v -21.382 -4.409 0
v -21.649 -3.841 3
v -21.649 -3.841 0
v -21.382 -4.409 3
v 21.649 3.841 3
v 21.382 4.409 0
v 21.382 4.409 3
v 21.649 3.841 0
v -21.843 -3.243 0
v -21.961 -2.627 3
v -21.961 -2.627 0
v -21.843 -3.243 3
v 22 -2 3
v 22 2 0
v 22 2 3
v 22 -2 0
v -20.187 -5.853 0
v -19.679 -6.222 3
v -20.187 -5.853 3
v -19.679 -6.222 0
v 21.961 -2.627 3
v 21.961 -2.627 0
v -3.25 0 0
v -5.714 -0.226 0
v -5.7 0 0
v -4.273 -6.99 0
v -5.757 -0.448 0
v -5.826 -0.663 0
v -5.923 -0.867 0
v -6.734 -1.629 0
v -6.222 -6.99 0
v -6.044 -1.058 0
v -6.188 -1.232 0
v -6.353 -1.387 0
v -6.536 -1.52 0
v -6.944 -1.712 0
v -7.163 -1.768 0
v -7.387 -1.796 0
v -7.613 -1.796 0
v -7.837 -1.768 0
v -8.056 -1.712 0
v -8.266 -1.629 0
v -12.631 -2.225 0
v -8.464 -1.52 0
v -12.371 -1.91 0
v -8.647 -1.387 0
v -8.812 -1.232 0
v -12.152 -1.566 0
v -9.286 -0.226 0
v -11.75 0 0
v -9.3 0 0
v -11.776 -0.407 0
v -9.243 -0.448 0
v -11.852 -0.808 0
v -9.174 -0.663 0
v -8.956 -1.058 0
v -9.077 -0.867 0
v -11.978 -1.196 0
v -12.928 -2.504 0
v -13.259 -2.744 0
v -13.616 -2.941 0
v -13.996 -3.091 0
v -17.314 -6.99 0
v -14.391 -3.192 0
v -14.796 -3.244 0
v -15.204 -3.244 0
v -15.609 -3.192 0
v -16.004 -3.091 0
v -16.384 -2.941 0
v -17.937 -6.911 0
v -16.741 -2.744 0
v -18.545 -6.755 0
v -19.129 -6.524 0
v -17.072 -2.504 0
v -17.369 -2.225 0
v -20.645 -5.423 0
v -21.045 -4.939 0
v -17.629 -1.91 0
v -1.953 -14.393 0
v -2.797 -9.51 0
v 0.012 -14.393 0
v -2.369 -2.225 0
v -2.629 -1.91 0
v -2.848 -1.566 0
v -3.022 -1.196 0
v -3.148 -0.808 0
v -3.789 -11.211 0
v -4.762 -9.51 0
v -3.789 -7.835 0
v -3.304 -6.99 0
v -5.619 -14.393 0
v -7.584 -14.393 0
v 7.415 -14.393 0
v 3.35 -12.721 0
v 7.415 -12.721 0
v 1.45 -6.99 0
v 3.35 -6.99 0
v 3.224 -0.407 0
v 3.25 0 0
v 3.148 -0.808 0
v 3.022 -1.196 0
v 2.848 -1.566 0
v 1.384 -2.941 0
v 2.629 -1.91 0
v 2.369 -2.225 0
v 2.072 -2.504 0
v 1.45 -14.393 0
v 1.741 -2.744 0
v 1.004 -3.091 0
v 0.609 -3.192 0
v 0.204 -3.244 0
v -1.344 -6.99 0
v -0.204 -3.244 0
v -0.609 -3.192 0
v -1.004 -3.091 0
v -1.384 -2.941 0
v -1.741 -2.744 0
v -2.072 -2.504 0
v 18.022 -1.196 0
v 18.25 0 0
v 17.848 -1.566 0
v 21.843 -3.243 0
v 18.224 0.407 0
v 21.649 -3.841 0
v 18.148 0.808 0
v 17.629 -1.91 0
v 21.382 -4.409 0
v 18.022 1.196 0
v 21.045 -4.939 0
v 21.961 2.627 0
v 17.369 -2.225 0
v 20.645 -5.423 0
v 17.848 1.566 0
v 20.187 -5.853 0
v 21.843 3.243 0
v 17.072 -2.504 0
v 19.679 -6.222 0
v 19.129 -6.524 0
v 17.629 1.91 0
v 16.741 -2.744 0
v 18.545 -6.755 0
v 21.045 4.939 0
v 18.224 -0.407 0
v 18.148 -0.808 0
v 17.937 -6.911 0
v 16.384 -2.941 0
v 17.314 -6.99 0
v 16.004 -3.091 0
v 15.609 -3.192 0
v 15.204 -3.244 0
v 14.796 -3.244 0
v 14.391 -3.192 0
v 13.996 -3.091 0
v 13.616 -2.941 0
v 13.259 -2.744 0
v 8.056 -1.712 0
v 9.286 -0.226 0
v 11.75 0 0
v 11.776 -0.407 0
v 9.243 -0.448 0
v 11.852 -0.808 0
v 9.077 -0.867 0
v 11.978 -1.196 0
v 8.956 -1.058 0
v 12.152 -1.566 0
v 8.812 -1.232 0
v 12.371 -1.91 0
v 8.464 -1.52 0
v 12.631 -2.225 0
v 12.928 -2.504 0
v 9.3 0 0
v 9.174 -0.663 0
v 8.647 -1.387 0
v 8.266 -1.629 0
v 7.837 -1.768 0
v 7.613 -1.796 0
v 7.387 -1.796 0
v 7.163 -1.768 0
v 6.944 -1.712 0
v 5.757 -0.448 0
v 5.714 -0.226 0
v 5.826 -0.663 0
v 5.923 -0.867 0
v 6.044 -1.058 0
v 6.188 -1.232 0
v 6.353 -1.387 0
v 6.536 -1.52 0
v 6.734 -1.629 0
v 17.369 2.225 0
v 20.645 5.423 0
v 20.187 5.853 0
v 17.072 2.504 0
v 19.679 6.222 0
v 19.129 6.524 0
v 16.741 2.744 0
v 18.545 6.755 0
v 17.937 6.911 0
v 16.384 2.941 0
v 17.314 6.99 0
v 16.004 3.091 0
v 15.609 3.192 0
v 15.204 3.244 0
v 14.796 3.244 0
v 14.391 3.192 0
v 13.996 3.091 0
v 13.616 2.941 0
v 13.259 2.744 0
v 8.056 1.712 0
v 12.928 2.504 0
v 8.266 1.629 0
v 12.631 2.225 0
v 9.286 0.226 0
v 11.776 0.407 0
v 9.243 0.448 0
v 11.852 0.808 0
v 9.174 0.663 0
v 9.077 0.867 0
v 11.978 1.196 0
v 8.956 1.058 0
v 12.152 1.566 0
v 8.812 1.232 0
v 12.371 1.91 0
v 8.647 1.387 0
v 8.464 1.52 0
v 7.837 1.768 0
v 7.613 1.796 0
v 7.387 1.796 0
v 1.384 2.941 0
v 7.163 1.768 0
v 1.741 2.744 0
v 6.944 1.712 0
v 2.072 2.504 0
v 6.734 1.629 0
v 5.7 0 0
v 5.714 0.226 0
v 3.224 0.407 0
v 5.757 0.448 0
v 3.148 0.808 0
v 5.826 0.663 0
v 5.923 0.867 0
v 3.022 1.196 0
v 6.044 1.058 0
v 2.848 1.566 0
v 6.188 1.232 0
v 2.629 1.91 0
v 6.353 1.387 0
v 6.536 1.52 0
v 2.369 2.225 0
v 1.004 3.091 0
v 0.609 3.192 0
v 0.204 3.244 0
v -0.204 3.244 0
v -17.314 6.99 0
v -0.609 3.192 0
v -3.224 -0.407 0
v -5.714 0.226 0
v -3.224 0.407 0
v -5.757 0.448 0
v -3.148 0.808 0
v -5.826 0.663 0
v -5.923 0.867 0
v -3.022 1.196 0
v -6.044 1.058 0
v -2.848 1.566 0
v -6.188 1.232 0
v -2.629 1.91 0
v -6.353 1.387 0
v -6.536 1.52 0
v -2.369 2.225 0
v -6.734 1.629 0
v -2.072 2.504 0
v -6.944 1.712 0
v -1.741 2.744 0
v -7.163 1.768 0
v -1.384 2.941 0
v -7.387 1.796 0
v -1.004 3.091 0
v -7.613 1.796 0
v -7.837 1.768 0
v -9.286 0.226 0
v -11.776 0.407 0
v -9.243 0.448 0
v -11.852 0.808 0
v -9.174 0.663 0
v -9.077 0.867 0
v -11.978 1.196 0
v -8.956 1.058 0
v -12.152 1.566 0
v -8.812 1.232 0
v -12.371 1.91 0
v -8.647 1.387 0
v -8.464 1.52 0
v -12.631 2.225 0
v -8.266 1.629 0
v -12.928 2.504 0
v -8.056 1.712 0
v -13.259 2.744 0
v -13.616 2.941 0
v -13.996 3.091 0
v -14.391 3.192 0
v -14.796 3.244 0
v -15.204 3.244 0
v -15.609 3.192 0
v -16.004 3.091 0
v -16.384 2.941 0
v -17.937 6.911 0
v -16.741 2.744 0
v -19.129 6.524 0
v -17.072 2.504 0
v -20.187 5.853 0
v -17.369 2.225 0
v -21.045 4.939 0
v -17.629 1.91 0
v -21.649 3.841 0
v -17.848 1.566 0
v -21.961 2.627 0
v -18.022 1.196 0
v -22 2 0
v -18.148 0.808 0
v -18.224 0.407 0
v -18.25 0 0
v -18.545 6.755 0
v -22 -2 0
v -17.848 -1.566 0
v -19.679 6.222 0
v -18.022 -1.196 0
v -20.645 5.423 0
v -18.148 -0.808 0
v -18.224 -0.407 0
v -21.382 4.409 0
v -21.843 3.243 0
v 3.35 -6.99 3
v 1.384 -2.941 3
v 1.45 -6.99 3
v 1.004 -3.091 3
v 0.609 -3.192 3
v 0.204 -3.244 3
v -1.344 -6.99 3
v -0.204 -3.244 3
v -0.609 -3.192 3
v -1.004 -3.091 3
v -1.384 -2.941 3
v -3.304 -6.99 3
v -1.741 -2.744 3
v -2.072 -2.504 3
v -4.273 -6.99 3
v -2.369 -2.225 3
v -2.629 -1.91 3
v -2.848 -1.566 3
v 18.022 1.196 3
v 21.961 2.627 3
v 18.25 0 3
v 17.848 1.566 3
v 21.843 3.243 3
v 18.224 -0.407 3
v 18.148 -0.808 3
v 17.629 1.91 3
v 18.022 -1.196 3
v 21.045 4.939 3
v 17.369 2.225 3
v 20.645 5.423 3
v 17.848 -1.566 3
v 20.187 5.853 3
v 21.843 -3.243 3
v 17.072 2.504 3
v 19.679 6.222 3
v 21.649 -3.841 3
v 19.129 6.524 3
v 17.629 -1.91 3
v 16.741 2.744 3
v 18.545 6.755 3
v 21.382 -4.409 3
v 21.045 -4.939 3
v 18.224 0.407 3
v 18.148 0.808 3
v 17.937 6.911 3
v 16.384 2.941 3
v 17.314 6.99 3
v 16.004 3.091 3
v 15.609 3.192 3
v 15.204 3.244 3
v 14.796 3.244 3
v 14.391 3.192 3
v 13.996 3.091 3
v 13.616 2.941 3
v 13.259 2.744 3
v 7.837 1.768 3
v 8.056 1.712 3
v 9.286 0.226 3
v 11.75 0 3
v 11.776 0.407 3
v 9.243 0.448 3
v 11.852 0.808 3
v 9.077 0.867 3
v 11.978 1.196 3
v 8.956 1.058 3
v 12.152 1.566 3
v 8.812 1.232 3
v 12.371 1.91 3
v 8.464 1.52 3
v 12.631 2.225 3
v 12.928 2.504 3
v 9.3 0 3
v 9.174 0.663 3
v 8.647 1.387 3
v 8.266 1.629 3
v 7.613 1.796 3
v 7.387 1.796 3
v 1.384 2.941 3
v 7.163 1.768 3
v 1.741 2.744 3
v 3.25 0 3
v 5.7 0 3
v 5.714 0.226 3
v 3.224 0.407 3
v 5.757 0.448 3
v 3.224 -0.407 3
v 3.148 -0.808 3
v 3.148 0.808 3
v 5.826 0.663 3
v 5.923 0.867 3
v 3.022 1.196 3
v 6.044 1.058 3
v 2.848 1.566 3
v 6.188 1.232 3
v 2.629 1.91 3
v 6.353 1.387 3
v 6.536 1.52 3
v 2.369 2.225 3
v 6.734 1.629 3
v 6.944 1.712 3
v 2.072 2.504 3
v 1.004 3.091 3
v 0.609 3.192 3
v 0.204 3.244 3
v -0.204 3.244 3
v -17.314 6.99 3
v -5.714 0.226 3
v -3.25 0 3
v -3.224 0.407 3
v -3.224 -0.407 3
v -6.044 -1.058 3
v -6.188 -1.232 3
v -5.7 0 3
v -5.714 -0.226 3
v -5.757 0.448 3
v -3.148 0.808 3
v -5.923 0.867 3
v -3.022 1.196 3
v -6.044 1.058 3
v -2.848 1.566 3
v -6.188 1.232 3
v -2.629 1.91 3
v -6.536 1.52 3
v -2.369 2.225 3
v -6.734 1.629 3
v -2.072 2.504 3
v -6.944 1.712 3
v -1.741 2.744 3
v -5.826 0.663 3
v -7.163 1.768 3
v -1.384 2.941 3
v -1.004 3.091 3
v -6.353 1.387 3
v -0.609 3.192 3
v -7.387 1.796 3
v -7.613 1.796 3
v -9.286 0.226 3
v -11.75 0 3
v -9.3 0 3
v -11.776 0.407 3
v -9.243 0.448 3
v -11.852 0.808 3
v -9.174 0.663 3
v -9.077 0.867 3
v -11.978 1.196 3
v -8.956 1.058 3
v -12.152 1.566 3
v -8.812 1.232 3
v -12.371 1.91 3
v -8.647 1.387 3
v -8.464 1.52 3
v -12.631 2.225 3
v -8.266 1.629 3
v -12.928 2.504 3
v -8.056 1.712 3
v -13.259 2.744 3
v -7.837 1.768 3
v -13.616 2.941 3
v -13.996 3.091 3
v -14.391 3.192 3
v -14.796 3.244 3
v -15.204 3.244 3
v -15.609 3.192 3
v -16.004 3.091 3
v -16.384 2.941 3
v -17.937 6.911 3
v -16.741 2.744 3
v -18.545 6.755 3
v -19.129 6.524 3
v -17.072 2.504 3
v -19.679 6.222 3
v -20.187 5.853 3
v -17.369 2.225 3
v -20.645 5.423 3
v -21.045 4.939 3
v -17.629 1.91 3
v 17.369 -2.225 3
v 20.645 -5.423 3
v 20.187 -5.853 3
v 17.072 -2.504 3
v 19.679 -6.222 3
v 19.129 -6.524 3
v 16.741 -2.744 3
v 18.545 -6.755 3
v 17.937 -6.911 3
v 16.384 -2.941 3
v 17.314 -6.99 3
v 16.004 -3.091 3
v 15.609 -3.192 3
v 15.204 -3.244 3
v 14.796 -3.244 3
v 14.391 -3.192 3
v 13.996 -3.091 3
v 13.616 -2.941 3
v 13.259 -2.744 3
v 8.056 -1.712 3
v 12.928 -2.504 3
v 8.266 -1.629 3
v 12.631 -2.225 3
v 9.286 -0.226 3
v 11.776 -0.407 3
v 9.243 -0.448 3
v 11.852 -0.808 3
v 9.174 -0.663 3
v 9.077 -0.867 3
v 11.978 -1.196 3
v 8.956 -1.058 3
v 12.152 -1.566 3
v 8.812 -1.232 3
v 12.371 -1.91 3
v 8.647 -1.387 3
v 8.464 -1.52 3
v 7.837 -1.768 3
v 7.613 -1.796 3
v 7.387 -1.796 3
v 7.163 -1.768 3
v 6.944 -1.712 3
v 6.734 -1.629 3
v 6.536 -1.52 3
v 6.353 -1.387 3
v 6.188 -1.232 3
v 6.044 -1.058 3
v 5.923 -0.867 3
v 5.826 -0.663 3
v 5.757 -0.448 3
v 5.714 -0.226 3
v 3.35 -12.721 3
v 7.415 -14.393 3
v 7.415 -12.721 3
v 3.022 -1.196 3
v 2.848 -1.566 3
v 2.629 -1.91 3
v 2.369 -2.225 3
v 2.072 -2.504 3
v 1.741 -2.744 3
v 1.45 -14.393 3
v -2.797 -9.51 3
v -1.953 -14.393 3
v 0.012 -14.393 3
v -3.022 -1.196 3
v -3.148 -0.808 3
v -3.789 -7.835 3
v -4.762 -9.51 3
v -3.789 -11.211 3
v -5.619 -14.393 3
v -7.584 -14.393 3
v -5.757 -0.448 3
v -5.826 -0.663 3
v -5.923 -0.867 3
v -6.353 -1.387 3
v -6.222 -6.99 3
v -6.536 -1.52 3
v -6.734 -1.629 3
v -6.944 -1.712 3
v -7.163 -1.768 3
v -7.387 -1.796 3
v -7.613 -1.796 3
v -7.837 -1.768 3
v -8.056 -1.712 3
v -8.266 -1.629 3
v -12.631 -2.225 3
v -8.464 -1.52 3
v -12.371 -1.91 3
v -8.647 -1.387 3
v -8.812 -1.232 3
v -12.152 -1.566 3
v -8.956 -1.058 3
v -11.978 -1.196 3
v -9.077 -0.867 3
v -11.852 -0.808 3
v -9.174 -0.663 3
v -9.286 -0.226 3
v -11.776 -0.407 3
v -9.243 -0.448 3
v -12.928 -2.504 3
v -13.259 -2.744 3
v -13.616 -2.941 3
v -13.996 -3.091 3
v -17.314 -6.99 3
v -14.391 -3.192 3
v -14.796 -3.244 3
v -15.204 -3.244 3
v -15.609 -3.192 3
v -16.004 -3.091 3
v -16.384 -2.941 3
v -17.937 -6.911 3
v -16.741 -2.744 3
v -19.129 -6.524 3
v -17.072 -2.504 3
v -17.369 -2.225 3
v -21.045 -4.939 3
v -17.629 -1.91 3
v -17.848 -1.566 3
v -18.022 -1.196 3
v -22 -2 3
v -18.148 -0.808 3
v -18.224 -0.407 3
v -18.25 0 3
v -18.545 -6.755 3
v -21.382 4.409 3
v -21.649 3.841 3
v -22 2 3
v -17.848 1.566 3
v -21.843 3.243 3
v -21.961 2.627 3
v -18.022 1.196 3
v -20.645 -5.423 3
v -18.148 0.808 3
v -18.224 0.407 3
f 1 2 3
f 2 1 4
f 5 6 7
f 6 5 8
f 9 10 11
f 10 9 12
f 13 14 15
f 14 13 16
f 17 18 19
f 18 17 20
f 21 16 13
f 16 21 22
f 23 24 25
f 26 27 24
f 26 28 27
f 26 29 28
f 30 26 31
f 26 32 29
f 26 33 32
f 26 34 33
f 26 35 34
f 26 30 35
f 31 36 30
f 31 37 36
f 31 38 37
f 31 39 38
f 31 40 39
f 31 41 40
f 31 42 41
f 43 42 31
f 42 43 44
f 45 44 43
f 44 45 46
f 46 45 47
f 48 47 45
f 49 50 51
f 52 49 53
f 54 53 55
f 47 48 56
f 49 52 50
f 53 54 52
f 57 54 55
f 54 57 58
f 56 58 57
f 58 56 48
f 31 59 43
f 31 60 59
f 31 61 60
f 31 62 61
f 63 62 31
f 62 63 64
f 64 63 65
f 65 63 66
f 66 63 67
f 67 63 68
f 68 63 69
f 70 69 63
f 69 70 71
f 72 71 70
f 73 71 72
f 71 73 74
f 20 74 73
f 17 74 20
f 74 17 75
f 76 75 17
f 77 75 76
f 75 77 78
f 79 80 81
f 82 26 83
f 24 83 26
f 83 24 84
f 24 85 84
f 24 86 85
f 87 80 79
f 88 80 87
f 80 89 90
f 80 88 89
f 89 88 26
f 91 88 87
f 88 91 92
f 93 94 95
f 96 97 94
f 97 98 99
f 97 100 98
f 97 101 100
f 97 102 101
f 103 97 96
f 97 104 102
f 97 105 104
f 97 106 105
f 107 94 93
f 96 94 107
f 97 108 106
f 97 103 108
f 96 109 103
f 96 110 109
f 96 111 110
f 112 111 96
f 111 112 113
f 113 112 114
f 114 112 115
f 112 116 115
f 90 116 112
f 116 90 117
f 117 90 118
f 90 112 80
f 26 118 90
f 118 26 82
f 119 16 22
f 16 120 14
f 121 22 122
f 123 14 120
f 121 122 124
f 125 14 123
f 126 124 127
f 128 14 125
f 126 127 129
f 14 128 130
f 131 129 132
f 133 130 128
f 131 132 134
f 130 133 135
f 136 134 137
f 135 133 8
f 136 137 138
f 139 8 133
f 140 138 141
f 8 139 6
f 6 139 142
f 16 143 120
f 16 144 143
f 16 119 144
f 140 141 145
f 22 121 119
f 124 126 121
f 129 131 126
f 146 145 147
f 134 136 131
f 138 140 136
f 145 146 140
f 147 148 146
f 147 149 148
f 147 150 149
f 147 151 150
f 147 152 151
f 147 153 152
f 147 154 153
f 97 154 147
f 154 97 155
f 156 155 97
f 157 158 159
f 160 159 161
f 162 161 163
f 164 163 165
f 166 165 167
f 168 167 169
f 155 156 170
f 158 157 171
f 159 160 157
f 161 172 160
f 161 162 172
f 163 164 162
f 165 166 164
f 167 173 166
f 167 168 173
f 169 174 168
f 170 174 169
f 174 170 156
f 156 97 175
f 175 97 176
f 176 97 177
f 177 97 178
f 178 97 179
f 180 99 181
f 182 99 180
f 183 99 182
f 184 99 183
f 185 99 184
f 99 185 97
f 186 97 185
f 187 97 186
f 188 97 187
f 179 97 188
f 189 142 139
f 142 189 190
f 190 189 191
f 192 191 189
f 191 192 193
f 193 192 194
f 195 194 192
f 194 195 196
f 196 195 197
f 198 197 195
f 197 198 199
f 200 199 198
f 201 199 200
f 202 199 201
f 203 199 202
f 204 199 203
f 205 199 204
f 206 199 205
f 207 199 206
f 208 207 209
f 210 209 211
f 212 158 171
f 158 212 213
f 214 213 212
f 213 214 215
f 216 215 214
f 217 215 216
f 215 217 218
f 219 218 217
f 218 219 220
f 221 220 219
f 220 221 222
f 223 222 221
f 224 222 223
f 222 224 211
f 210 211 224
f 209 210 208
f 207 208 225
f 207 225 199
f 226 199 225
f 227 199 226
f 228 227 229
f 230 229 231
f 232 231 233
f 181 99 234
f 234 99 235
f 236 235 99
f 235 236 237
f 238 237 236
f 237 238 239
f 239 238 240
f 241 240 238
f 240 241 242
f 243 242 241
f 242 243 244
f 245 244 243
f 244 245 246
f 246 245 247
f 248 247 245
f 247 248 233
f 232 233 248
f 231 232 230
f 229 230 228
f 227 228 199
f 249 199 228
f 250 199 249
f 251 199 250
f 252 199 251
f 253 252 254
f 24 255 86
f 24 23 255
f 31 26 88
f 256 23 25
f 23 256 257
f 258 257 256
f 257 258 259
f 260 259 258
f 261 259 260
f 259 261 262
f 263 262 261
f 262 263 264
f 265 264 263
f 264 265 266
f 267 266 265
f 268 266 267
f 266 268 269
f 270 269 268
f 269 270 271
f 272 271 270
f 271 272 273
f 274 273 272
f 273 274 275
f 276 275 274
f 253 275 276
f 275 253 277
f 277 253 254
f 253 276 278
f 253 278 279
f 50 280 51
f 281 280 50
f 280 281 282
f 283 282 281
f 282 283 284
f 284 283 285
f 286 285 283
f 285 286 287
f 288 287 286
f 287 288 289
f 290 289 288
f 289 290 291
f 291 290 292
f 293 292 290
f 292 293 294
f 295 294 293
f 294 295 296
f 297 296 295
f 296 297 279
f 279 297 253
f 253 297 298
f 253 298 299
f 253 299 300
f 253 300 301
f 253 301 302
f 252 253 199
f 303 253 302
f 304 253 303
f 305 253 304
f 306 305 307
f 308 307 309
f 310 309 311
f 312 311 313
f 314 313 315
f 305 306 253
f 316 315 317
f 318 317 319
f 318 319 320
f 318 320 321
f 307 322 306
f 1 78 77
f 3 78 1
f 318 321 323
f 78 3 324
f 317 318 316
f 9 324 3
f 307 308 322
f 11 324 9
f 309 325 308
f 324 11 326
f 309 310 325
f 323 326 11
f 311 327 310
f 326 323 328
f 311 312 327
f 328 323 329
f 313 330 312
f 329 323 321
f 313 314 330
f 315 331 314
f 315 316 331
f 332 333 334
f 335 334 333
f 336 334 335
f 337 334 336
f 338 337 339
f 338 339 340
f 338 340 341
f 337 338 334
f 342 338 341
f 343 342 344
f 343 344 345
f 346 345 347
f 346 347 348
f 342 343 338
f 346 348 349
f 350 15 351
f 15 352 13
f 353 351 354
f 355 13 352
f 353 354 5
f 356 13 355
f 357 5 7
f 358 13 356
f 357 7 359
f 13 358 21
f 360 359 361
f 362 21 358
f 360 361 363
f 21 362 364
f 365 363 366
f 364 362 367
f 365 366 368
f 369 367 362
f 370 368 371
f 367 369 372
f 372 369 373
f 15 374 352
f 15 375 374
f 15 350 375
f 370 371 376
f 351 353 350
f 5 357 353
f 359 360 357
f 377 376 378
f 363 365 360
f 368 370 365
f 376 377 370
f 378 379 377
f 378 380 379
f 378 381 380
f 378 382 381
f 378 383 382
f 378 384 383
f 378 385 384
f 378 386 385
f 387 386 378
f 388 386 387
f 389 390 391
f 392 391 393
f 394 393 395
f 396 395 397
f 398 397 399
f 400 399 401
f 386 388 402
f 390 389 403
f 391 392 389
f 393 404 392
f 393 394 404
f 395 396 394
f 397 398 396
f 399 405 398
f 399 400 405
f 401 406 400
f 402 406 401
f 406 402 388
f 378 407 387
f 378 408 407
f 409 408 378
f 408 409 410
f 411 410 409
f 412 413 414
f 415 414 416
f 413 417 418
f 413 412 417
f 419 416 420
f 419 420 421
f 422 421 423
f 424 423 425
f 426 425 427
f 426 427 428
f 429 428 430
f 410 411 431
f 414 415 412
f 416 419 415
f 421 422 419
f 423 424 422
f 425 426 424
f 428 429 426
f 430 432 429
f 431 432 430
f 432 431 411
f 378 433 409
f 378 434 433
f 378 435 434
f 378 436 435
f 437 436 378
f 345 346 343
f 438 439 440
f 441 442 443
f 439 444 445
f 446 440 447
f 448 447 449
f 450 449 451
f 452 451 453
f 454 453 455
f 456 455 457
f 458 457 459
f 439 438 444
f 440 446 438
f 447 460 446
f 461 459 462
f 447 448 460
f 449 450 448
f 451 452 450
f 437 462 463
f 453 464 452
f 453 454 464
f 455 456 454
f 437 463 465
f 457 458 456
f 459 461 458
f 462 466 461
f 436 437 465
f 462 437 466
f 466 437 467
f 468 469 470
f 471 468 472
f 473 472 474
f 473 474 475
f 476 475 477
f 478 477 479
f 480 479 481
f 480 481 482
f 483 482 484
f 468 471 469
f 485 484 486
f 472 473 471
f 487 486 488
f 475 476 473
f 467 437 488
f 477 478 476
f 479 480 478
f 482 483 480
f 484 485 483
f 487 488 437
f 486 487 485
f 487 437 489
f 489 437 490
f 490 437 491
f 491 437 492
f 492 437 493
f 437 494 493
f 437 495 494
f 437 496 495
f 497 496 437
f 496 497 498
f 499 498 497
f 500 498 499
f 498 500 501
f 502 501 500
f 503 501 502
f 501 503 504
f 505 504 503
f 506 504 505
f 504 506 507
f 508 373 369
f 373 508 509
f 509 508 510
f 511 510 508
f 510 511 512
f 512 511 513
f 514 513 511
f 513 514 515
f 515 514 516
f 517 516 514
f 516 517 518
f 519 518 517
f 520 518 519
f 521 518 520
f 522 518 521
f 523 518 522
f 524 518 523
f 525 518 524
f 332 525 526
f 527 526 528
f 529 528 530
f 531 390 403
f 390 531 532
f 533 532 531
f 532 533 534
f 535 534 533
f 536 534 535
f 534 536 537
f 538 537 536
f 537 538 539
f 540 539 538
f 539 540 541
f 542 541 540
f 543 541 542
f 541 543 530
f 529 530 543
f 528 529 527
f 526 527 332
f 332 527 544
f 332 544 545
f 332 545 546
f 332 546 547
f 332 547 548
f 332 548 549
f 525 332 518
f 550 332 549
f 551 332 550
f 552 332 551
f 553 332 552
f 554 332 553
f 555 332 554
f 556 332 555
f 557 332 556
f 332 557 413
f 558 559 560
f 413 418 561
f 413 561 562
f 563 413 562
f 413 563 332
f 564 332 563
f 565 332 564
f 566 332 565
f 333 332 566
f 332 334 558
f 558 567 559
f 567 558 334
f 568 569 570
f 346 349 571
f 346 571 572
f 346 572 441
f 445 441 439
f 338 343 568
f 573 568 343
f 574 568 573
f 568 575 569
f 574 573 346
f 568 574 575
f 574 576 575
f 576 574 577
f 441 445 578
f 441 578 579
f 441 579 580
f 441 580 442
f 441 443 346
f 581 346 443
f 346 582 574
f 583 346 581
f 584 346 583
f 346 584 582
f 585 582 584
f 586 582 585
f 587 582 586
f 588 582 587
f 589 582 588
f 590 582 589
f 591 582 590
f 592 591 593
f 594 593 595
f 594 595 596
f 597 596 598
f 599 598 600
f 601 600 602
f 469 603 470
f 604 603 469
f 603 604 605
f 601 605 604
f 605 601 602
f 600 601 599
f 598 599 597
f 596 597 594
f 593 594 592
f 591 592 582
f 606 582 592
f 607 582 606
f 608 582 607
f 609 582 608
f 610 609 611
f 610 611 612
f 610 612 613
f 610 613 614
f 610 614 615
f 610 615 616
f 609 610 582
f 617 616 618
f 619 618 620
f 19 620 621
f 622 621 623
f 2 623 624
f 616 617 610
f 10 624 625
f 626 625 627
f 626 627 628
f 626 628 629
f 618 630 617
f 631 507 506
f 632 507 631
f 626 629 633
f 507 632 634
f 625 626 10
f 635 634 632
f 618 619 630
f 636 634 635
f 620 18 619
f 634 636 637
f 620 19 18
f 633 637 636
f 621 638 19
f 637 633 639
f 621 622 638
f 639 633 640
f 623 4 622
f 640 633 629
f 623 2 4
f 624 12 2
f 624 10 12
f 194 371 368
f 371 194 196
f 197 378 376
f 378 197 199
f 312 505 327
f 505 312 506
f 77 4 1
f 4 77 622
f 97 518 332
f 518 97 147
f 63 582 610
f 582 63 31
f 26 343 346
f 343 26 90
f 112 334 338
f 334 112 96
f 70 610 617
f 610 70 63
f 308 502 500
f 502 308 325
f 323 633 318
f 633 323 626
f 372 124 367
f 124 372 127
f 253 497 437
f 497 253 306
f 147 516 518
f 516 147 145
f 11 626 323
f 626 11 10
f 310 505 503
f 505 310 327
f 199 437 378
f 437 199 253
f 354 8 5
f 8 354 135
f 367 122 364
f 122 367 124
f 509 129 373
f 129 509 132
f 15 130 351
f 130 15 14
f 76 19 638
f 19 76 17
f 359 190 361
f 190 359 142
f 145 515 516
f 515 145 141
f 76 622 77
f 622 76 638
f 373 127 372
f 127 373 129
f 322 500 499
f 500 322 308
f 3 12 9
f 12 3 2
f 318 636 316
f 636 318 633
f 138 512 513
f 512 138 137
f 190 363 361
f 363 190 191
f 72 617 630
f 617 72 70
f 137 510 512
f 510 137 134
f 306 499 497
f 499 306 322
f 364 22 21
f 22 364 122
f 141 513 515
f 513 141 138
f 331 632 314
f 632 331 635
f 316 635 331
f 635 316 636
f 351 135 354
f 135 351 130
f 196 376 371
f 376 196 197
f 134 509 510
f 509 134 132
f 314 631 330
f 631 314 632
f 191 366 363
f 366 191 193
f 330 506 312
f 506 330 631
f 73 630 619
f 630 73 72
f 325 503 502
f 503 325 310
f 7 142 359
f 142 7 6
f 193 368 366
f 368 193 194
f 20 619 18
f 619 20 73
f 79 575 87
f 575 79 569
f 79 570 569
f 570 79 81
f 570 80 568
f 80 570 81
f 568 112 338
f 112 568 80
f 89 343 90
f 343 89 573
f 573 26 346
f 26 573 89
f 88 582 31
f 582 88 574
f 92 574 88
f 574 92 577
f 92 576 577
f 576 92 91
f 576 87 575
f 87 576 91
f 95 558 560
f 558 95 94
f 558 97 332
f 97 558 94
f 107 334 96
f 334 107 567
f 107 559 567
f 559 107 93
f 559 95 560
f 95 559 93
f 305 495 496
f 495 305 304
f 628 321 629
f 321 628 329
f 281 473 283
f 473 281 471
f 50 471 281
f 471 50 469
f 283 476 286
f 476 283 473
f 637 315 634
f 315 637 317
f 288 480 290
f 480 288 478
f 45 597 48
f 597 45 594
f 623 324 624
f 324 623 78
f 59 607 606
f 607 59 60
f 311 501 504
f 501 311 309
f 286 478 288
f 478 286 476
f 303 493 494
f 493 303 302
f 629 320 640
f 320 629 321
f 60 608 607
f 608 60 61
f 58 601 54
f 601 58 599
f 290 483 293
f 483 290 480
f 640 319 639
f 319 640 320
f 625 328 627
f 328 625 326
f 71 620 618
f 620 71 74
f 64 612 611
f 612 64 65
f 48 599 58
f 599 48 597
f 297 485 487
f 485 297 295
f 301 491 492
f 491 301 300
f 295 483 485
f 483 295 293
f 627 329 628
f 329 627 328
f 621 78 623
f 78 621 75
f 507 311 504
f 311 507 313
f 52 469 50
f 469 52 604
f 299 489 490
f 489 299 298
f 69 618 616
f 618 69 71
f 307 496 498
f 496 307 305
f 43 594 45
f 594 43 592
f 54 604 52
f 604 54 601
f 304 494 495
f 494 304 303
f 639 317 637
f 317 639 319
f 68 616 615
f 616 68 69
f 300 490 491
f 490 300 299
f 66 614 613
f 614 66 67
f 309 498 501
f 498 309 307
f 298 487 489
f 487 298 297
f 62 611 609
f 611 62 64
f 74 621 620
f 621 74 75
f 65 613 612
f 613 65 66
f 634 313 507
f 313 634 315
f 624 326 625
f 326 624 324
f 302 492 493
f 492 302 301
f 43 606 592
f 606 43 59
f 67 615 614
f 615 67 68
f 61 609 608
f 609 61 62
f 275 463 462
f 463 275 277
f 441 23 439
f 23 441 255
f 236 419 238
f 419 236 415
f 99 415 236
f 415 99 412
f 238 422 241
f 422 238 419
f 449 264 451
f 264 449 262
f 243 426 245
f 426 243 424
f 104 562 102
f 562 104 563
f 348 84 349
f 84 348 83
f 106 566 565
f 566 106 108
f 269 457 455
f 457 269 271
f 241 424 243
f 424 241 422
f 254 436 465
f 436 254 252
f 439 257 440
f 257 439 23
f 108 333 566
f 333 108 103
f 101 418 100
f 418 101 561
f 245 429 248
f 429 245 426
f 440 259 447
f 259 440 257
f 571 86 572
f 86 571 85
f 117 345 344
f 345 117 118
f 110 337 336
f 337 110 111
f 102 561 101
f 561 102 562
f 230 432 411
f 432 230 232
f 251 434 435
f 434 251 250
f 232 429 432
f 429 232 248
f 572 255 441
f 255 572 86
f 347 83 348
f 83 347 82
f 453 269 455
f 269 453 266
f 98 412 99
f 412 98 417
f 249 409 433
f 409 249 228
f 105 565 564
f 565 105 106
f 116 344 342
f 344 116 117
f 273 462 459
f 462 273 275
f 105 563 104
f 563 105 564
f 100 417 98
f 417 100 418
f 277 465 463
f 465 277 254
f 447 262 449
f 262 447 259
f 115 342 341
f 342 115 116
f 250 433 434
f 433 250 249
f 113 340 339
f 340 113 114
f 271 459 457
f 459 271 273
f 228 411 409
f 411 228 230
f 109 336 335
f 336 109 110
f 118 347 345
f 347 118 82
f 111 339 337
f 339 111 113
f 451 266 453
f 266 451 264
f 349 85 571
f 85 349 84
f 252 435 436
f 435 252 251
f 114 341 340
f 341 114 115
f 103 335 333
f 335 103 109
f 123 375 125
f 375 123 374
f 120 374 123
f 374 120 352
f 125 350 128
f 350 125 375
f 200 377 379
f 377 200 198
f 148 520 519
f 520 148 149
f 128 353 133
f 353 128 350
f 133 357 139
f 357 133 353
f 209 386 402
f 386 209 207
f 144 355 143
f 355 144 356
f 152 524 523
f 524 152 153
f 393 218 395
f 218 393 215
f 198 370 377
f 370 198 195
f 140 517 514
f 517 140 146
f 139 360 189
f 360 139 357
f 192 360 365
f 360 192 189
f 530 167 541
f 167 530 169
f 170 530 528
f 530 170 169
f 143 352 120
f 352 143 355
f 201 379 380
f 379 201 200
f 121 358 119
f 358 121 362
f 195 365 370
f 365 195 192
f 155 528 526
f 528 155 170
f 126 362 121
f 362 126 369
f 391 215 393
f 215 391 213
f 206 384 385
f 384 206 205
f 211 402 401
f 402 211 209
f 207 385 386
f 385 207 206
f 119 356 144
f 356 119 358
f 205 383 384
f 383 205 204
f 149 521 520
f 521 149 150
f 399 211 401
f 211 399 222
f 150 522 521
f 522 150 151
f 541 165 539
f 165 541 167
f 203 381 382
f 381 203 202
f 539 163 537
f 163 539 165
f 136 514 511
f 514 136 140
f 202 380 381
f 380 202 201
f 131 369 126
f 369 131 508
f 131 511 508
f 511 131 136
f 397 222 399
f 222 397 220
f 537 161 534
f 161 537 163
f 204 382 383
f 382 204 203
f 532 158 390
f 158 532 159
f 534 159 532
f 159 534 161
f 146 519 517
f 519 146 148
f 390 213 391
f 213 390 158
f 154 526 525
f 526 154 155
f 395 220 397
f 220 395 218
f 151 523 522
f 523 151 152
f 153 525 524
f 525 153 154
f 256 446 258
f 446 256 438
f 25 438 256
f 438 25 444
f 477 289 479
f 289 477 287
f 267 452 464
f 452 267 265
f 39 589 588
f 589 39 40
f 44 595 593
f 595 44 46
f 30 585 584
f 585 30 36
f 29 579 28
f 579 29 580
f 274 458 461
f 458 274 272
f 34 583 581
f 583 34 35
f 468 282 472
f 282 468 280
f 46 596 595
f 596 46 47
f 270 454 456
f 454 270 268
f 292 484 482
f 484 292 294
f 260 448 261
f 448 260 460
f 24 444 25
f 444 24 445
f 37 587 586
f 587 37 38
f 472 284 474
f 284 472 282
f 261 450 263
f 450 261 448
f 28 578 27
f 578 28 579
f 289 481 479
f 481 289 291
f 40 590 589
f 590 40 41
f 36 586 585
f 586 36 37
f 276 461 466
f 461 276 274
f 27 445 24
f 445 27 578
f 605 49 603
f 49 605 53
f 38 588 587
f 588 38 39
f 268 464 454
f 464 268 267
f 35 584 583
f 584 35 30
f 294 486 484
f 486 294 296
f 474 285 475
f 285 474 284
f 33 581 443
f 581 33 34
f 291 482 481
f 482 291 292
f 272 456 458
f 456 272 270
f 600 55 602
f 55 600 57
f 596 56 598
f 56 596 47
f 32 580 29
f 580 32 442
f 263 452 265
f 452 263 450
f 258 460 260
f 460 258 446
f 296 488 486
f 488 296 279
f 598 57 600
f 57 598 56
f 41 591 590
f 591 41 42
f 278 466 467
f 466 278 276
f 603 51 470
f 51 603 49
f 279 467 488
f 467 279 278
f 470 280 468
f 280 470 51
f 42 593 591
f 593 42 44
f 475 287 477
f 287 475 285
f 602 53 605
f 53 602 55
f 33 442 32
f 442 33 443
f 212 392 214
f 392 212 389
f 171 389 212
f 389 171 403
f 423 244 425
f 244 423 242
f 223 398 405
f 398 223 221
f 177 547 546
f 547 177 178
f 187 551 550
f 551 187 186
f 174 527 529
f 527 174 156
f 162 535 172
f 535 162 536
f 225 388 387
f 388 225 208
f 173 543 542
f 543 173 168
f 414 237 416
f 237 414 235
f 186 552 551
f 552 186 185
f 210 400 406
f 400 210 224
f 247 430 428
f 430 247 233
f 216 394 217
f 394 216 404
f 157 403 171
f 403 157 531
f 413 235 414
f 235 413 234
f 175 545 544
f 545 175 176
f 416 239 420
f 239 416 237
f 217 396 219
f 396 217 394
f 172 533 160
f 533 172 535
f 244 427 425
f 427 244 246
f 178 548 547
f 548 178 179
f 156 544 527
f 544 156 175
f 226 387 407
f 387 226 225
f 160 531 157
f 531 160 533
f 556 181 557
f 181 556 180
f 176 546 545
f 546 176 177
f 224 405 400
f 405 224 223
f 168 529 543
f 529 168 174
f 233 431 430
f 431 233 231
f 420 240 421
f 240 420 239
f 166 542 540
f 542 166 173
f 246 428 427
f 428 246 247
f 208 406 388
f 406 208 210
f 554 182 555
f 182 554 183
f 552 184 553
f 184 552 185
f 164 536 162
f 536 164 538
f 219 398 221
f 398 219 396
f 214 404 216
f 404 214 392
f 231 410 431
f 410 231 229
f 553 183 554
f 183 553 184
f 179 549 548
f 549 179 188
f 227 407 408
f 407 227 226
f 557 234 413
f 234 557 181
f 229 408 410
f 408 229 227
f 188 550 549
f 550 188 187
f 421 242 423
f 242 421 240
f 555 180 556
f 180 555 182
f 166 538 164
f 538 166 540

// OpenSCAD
$fn = 50;


difference() {
	union() {
		hull() {
			translate(v = [-17.0000000000, 2.0000000000, 0]) {
				cylinder(h = 3, r = 5);
			}
			translate(v = [17.0000000000, 2.0000000000, 0]) {
				cylinder(h = 3, r = 5);
			}
			translate(v = [-17.0000000000, -2.0000000000, 0]) {
				cylinder(h = 3, r = 5);
			}
			translate(v = [17.0000000000, -2.0000000000, 0]) {
				cylinder(h = 3, r = 5);
			}
		}
		translate(v = [0, -5, 0]) {
			linear_extrude(height = 3) {
				text(font = "DejaVu Sans Mono:style=Bold", halign = "center", size = 9.5000000000, text = "XL", valign = "top");
			}
		}
	}
	union() {
		translate(v = [-15.0000000000, 0.0000000000, 0]) {
			translate(v = [0, 0, -100]) {
				cylinder(h = 200, r = 3.2500000000);
			}
		}
		translate(v = [0, 0, -100]) {
			cylinder(h = 200, r = 3.2500000000);
		}
		translate(v = [15.0000000000, 0.0000000000, 0]) {
			translate(v = [0, 0, -100]) {
				cylinder(h = 200, r = 3.2500000000);
			}
		}
		translate(v = [-15.0000000000, 0.0000000000, 0]) {
			translate(v = [0, 0, -100]) {
				cylinder(h = 200, r = 1.8000000000);
			}
		}
		translate(v = [-7.5000000000, 0.0000000000, 0]) {
			translate(v = [0, 0, -100]) {
				cylinder(h = 200, r = 1.8000000000);
			}
		}
		translate(v = [0, 0, -100]) {
			cylinder(h = 200, r = 1.8000000000);
		}
		translate(v = [7.5000000000, 0.0000000000, 0]) {
			translate(v = [0, 0, -100]) {
				cylinder(h = 200, r = 1.8000000000);
			}
		}
		translate(v = [15.0000000000, 0.0000000000, 0]) {
			translate(v = [0, 0, -100]) {
				cylinder(h = 200, r = 1.8000000000);
			}
		}
	}
}
